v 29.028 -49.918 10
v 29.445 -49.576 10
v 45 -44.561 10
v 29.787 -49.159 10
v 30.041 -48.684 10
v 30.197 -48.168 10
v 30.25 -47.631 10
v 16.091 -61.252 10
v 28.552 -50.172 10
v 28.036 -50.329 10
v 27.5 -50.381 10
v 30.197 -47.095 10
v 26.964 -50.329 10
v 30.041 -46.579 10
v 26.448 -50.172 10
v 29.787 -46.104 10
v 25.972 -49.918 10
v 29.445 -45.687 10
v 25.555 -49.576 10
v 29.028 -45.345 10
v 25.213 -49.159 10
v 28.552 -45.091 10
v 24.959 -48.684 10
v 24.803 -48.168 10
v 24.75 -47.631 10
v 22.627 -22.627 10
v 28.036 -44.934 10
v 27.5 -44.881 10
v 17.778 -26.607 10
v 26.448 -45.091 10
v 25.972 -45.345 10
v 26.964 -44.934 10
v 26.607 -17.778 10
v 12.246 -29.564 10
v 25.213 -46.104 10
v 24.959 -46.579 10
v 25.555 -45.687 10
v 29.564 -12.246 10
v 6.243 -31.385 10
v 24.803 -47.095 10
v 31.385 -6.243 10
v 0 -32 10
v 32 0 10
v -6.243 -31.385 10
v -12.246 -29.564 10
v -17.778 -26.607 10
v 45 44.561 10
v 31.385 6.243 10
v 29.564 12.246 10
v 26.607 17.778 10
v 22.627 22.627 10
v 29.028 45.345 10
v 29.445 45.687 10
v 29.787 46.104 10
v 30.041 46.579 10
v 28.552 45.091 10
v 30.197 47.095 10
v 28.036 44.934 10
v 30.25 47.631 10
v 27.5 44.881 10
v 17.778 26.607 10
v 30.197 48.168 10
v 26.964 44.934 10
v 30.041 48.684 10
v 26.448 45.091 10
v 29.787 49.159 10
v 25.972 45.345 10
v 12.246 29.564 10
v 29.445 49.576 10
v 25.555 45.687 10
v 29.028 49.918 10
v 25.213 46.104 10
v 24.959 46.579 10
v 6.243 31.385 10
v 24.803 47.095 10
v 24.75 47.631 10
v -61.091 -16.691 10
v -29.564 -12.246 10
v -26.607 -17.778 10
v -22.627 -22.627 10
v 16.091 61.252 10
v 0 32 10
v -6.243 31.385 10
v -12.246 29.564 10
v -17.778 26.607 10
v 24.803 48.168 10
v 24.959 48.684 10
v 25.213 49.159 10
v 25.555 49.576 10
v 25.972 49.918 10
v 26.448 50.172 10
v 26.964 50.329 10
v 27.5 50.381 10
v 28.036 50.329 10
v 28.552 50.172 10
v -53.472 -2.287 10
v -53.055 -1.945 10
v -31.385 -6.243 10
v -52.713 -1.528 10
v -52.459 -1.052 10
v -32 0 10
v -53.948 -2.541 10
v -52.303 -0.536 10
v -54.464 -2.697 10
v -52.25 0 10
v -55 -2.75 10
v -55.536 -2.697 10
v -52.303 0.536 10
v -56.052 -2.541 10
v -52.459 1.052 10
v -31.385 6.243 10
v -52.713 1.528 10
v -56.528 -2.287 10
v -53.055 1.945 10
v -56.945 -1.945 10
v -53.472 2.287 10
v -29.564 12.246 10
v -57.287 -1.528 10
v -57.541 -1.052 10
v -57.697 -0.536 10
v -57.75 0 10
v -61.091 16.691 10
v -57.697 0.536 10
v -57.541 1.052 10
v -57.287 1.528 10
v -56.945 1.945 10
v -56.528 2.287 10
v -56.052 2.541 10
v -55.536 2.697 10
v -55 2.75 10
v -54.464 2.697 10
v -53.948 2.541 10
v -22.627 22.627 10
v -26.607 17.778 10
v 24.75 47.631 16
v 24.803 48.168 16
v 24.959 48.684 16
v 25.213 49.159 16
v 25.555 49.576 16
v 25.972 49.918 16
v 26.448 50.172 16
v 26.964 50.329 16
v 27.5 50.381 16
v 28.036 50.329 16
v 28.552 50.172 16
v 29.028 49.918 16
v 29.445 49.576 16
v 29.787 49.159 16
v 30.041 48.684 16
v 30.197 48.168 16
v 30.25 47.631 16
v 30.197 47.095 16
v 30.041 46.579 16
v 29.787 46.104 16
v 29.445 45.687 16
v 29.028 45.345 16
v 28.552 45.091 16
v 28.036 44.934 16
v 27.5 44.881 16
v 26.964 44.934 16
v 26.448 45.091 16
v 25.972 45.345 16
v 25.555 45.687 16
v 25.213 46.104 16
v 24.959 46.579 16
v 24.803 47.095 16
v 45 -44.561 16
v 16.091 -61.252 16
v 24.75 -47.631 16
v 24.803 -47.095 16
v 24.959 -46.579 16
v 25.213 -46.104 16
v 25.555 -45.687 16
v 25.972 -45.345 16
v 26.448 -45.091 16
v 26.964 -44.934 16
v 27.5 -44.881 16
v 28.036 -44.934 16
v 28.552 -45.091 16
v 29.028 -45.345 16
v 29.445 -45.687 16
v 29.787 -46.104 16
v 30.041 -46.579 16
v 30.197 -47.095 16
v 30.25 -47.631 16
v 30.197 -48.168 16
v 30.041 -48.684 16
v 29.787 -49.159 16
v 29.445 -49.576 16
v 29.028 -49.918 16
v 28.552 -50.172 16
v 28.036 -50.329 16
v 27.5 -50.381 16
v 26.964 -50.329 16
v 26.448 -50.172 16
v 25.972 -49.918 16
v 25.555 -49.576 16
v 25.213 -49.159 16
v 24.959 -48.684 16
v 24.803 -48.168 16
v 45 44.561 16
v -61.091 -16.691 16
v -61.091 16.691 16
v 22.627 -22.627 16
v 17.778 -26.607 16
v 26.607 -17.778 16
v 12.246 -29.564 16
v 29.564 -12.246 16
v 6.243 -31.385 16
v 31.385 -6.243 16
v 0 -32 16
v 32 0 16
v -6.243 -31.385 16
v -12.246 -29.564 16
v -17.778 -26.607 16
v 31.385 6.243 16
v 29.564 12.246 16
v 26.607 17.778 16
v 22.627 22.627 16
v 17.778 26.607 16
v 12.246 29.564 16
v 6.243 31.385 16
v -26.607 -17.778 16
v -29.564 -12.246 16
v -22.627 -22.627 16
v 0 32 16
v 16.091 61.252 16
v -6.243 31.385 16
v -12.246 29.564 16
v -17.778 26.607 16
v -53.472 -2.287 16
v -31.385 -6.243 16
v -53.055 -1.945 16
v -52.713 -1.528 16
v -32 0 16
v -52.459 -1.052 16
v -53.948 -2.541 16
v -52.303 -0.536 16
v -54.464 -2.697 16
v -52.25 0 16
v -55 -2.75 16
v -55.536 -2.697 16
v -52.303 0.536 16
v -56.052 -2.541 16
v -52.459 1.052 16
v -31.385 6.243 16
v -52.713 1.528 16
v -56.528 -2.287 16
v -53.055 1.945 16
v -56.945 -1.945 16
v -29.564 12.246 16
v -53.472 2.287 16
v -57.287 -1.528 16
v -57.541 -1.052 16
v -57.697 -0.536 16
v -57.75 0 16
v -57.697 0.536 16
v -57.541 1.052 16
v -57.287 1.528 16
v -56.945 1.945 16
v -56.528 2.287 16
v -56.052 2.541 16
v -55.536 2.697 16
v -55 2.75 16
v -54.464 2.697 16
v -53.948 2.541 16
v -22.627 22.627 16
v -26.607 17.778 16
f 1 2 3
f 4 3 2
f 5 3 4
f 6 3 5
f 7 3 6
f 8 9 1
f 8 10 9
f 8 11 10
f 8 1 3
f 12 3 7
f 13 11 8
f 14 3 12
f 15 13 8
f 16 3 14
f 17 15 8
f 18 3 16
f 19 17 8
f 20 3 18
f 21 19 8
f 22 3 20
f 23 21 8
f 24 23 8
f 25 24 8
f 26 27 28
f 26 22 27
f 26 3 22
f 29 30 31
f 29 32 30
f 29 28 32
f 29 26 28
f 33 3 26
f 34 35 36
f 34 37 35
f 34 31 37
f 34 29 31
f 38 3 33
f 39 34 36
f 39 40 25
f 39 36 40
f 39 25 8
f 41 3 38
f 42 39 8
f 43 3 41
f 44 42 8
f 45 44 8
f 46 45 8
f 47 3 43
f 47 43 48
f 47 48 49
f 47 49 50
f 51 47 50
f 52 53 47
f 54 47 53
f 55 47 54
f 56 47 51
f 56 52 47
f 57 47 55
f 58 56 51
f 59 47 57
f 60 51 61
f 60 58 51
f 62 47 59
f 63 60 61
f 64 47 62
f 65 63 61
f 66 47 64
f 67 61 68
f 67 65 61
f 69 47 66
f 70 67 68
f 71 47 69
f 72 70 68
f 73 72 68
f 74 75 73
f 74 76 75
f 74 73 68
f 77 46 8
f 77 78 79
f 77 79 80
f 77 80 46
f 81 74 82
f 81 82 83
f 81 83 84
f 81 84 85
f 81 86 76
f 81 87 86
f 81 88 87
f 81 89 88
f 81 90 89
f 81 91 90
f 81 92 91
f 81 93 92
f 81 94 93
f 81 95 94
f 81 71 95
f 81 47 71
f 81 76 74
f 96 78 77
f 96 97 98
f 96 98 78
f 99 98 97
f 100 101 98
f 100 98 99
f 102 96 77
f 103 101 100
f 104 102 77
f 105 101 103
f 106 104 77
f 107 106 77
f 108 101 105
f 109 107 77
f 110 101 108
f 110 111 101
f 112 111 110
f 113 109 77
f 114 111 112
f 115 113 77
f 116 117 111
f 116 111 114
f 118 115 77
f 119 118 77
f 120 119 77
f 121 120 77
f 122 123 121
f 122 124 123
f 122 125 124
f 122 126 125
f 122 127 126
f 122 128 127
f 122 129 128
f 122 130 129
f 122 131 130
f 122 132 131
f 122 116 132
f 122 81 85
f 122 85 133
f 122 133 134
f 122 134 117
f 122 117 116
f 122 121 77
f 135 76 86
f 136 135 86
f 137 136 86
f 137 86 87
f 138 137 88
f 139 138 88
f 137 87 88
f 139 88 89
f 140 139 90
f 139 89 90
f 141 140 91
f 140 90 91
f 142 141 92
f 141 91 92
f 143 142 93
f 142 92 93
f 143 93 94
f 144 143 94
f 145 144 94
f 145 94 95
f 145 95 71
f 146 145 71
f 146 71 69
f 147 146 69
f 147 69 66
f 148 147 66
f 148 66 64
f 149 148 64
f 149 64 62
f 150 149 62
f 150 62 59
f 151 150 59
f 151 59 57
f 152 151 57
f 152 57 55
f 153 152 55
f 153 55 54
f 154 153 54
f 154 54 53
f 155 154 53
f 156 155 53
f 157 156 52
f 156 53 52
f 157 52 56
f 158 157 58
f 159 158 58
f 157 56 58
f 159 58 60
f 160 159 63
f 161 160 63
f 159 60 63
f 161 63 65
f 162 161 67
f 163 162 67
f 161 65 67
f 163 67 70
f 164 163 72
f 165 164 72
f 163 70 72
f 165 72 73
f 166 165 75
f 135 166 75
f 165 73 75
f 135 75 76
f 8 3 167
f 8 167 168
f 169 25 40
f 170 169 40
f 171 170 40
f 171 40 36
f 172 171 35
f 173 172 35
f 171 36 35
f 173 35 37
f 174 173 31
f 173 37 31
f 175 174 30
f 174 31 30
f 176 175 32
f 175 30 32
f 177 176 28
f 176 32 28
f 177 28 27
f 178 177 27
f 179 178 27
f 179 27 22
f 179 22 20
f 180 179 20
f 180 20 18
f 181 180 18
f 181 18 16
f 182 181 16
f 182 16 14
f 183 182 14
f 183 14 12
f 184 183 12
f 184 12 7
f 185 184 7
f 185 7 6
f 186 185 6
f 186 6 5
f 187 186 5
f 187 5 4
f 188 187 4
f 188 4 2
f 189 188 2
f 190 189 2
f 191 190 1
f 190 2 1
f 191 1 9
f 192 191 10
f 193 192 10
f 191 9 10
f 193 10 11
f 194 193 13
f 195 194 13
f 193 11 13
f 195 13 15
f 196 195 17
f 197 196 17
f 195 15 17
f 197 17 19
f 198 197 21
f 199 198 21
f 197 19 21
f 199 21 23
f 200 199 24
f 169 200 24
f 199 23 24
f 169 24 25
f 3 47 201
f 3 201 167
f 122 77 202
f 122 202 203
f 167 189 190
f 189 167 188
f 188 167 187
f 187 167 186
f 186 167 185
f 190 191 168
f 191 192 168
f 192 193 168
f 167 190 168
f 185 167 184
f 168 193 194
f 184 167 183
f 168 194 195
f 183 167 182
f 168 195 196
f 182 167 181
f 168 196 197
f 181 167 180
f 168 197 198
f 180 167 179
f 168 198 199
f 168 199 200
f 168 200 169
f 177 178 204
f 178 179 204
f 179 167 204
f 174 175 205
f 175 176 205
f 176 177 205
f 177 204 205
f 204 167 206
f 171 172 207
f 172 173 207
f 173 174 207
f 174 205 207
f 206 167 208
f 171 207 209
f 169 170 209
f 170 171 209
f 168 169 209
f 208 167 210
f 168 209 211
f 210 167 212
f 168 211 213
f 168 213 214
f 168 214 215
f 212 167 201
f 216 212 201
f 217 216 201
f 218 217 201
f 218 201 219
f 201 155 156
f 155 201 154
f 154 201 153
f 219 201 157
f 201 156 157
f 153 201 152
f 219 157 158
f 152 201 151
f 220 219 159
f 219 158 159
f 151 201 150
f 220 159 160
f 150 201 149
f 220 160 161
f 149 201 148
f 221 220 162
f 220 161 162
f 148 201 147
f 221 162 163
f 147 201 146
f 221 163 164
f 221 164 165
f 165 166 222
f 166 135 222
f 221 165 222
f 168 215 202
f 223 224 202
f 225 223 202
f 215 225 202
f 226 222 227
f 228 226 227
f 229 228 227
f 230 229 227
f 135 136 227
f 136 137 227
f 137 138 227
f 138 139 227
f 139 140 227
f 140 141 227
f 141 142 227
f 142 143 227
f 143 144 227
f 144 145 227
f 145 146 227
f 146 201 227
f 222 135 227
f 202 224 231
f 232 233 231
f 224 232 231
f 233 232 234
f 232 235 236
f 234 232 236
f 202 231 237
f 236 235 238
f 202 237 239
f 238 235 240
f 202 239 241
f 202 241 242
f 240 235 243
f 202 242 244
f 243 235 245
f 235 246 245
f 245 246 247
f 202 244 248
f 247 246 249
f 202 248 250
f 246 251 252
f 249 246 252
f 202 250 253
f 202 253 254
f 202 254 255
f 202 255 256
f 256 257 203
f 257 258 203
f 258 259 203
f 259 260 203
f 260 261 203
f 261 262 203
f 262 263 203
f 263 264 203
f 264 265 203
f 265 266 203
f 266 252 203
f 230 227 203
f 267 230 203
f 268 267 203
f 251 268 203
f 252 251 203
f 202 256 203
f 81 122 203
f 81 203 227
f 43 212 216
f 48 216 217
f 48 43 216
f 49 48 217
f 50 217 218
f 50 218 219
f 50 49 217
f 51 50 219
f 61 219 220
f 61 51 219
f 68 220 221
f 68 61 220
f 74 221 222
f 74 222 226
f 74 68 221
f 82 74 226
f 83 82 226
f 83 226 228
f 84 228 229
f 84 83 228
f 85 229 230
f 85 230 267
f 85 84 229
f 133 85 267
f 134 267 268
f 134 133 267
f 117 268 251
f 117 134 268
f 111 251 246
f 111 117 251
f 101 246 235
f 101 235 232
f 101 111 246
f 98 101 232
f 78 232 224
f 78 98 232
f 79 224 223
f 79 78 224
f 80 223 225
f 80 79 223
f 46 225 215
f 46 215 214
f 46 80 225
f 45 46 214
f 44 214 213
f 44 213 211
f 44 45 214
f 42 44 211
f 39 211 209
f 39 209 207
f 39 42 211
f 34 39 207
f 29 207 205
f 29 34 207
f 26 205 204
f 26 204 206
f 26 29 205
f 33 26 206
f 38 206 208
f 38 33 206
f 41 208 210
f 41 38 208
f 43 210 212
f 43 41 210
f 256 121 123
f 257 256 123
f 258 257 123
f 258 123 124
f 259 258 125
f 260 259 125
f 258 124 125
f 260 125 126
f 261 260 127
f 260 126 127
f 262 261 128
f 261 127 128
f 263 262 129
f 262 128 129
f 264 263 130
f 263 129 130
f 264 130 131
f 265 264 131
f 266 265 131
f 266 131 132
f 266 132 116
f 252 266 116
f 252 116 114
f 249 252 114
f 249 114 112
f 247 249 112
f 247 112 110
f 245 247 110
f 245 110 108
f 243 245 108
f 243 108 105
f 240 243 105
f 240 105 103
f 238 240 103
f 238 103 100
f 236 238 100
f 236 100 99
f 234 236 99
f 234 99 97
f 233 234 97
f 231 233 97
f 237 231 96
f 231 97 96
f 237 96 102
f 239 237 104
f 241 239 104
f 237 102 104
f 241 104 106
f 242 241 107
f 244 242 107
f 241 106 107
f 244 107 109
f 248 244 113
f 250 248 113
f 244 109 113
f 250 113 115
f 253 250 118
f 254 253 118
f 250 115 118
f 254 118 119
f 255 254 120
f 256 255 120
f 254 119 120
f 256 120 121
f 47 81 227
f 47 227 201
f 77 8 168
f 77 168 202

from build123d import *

# Parameters (mm, degrees)
ESBO_O1_R                = 32
RESSALTO_EXTRUS_O1_DEPTH = 6
FURO_COM_FOLGA_DE_M51_D  = 5.5


with BuildPart() as part:
    # Esboço1 → Ressalto-extrusão1 (new body)
    with BuildSketch(Plane.XY.offset(10)):
        Polygon((16.091018061, 61.251677836), (45, 44.561069332), (45, -44.561069332), (16.091018061, -61.251677836), (-61.091018061, -16.690608504), (-61.091018061, 16.690608504), align=None)
        Circle(ESBO_O1_R, mode=Mode.SUBTRACT)
    extrude(amount=RESSALTO_EXTRUS_O1_DEPTH)

    # Furo com folga de M51 (through all)
    with Locations(Plane(origin=(-55, 0, 16), x_dir=(1, 0, 0), z_dir=(0, 0, 1))):
        with Locations((0, 0), (82.5, 47.631397208), (82.5, -47.631397208)):
            Hole(FURO_COM_FOLGA_DE_M51_D / 2)


solid = part.part
